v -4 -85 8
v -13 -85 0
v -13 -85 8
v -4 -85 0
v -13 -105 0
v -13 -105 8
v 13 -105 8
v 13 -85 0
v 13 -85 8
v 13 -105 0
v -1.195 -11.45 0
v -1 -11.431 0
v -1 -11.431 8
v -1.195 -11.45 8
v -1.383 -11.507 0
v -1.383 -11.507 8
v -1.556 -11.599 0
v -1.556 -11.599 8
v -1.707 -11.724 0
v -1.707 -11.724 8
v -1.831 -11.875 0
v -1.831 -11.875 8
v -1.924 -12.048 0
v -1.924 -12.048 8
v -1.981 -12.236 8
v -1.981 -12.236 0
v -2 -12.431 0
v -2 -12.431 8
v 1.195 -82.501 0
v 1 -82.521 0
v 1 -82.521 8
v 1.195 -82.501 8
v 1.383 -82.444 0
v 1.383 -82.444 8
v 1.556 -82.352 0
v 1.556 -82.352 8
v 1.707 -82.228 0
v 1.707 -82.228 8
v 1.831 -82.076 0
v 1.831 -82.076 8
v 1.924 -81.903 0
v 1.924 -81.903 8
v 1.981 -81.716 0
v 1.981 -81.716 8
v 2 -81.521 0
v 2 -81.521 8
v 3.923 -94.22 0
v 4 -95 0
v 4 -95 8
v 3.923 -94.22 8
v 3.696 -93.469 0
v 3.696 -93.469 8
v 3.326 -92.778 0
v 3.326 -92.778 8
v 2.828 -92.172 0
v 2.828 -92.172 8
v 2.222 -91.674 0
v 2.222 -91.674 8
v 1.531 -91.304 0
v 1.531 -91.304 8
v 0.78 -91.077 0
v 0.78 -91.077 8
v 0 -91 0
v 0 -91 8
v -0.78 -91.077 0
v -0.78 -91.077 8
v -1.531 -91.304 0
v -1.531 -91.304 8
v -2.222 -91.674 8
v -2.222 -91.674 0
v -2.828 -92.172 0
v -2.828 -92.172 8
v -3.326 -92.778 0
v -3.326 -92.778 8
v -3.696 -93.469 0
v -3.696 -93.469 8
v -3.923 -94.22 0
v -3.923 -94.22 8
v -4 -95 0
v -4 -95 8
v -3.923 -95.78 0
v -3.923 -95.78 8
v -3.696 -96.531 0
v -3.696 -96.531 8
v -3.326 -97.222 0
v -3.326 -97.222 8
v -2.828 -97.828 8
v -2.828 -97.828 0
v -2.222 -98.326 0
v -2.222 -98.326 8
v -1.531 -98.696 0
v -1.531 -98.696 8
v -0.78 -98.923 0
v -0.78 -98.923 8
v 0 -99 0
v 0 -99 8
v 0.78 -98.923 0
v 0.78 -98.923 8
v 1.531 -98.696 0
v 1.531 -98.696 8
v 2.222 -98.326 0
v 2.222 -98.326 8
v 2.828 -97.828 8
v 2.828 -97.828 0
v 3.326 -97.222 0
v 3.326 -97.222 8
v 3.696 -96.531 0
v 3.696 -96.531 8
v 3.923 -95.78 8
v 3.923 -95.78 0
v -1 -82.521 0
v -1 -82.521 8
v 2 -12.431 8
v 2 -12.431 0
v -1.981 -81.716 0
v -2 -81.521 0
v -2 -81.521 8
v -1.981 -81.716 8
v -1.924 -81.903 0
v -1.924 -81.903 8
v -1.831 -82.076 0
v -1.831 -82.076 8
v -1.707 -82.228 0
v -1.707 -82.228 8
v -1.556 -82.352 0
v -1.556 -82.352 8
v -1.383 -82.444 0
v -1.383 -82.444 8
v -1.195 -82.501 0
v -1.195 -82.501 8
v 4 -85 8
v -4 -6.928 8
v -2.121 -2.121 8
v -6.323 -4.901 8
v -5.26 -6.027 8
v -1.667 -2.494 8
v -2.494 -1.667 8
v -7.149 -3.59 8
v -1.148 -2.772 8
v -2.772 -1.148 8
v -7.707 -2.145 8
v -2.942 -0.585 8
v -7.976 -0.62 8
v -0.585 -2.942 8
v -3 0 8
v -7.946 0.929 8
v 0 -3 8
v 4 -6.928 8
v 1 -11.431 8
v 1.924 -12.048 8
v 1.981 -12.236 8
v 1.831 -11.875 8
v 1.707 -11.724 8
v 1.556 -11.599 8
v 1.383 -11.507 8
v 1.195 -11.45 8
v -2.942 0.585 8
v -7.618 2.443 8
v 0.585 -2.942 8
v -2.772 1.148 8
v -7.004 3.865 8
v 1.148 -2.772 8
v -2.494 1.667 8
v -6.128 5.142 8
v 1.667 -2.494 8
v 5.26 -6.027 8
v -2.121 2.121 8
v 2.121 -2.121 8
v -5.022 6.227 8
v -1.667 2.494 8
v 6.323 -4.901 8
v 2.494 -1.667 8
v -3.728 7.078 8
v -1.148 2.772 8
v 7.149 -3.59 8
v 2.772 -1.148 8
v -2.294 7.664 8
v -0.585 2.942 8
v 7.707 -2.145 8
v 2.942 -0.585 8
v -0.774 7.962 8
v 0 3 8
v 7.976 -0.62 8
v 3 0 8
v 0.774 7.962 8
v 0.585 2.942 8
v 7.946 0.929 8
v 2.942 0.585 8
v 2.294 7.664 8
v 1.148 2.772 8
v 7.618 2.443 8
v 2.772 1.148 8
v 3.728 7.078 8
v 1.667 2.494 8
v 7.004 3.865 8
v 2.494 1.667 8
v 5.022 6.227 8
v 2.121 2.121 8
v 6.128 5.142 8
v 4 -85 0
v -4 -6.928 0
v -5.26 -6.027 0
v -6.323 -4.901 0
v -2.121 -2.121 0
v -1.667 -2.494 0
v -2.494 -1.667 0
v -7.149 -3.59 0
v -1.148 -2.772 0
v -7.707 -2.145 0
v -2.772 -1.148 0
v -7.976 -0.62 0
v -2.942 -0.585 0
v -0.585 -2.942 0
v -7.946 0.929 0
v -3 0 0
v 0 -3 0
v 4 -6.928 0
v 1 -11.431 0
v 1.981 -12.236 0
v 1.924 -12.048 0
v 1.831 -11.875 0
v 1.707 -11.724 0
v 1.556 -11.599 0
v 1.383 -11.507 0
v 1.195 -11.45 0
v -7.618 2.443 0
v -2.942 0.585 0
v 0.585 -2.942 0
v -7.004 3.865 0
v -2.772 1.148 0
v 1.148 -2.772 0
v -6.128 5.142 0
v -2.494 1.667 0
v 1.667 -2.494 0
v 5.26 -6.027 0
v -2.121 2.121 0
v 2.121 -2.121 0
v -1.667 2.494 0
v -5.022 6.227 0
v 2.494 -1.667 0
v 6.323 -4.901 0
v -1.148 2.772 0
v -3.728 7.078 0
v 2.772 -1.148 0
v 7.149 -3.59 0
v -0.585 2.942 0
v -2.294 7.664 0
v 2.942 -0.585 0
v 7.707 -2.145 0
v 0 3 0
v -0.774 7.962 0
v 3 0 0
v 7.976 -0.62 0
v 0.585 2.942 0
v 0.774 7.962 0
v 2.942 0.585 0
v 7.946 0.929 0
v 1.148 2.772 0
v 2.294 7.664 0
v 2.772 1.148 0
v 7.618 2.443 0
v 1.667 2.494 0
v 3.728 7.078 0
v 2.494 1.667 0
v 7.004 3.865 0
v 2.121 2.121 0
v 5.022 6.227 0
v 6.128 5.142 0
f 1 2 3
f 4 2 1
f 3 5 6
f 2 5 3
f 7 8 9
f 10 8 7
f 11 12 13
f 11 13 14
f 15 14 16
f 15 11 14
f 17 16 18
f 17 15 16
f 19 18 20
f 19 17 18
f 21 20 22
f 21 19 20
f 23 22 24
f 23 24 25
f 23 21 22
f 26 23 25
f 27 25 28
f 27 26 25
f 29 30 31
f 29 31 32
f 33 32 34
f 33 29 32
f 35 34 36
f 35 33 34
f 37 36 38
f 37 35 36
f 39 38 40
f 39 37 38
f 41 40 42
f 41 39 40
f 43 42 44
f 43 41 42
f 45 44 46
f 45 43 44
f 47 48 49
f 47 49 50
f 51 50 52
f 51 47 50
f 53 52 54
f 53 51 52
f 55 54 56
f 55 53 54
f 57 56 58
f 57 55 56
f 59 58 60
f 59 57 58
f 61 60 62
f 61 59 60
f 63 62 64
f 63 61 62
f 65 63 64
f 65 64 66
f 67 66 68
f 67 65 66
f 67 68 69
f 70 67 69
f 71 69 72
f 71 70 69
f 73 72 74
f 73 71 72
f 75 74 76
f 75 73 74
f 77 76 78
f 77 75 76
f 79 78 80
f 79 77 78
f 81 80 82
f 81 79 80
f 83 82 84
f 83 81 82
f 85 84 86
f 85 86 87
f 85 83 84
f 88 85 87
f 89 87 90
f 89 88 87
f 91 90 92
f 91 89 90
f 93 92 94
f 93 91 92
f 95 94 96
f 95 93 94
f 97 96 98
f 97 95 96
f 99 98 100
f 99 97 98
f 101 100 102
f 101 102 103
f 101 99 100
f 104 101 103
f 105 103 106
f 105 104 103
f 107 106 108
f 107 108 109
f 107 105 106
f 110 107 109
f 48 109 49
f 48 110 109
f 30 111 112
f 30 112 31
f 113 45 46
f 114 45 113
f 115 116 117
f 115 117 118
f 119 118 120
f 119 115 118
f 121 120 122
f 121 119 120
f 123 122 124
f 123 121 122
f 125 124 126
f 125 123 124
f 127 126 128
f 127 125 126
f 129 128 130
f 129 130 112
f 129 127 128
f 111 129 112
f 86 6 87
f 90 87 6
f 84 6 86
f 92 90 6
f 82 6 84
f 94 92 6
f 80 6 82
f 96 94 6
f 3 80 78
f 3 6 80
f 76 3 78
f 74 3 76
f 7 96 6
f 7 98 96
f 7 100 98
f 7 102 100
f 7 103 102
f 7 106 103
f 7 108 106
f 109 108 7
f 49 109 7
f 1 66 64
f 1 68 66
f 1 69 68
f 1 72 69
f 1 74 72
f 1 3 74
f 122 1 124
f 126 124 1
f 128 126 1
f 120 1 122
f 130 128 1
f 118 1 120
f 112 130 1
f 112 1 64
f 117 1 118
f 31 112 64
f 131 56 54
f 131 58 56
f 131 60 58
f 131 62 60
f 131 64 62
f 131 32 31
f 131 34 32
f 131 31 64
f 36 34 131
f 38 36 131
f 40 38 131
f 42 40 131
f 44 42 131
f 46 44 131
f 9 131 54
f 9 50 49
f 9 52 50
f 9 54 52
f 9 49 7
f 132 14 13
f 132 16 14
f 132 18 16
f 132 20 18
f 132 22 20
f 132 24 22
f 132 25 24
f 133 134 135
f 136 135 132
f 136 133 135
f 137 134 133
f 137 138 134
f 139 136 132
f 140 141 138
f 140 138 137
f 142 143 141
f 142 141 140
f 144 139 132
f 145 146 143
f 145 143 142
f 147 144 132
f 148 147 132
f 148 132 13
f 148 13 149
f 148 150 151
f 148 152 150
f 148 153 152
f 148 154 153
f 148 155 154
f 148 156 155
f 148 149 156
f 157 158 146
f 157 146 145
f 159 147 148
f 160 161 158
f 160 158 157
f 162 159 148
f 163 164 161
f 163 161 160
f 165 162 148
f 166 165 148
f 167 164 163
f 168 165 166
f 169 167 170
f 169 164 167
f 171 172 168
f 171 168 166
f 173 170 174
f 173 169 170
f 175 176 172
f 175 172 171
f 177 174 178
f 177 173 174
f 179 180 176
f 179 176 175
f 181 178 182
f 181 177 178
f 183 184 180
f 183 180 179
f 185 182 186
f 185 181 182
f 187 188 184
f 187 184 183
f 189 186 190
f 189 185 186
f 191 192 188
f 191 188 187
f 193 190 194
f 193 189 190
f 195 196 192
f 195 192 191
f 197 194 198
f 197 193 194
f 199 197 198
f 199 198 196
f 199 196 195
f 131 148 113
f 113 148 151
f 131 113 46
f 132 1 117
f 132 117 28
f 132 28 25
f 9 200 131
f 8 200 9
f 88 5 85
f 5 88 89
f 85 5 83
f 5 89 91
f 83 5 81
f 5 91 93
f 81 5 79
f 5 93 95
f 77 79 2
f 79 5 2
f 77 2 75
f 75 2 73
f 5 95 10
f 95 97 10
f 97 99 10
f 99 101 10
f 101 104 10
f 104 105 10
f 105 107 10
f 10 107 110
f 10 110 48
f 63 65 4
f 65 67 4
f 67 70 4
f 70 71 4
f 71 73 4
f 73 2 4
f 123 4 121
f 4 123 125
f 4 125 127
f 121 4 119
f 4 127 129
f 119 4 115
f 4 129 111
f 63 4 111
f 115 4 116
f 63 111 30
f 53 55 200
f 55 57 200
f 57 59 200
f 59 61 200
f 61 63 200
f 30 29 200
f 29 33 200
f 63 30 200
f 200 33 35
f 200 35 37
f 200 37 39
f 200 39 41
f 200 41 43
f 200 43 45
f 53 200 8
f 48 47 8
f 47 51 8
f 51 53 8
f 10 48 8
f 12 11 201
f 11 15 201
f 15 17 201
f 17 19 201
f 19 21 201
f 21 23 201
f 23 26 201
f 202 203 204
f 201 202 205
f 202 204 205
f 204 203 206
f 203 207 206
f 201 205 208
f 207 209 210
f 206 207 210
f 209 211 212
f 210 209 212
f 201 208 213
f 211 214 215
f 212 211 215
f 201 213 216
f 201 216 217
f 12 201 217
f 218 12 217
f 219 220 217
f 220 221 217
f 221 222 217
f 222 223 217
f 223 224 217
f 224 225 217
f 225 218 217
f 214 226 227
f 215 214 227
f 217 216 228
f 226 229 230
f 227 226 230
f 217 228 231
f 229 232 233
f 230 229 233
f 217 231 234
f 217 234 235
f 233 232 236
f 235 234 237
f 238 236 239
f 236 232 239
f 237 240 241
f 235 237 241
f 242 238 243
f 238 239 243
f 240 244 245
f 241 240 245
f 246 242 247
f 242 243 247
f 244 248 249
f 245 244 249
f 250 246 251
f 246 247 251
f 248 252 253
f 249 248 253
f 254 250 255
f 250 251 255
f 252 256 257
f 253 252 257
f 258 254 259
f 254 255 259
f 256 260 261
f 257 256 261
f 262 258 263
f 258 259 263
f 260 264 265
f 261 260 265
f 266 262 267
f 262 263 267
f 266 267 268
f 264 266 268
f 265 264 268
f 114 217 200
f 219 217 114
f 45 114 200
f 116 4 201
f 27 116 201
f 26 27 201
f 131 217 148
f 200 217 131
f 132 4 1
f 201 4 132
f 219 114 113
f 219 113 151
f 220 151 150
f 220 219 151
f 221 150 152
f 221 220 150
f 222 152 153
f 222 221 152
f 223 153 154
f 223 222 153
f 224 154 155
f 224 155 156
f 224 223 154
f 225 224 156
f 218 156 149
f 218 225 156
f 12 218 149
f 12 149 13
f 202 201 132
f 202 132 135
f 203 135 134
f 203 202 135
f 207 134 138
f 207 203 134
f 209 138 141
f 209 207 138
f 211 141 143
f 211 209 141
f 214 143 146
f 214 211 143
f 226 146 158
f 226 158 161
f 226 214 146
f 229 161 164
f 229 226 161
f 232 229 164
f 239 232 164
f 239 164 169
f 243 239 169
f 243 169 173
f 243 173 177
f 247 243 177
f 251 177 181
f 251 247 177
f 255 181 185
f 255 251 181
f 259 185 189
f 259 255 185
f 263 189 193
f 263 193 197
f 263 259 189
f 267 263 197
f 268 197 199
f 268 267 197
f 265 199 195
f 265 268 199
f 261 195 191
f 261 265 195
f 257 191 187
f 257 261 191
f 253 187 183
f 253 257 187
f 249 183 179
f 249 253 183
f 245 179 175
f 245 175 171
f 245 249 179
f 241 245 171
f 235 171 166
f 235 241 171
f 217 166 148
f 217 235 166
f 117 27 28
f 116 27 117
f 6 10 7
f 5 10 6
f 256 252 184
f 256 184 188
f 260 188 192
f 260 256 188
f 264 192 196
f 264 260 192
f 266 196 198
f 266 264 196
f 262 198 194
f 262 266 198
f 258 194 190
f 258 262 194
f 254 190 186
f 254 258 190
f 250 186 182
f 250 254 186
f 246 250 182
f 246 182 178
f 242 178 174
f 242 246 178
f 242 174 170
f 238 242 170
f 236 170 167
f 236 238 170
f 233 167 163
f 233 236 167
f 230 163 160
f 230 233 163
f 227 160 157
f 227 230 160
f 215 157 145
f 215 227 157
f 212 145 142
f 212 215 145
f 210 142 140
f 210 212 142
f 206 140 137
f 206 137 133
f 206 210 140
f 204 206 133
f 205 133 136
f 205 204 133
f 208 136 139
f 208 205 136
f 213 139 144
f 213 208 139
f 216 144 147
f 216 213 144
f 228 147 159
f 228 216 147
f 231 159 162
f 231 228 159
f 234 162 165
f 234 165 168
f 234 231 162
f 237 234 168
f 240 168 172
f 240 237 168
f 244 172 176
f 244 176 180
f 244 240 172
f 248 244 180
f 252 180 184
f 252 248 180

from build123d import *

# Parameters (mm, degrees)
SKETCH1_R           = 6
SKETCH1_R_2         = 5
SKETCH1_R_3         = 3
SKETCH1_R_4         = 4
BOSS_EXTRUDE1_DEPTH = 8


with BuildPart() as part:
    # Sketch1 → Boss-Extrude1 (new body)
    # profile 1 of 3: a face of its own
    with BuildSketch(Plane.XY):
        with BuildLine():
            Line((4, -6.92820323), (4, -85))
            Line((4, -85), (13, -85))
            Line((13, -85), (13, -105))
            Line((13, -105), (-13, -105))
            Line((-13, -105), (-13, -85))
            Line((-13, -85), (-4, -85))
            Line((-4, -85), (-4, -6.92820323))
            ThreePointArc((-4, -6.92820323), (0, 8), (4, -6.92820323))
        make_face()
        with Locations((0, -95)):
            Circle(SKETCH1_R, mode=Mode.SUBTRACT)
        Circle(SKETCH1_R_2, mode=Mode.SUBTRACT)
        with BuildLine():
            Line((-2, -12.430963228), (-2, -81.520541763))
            ThreePointArc((-2, -81.520541763), (-1.707106781, -82.227648544), (-1, -82.520541763))
            Line((-1, -82.520541763), (1, -82.520541763))
            ThreePointArc((1, -82.520541763), (1.707106781, -82.227648544), (2, -81.520541763))
            Line((2, -81.520541763), (2, -12.430963228))
            ThreePointArc((2, -12.430963228), (1.707106781, -11.723856446), (1, -11.430963228))
            Line((1, -11.430963228), (-1, -11.430963228))
            ThreePointArc((-1, -11.430963228), (-1.707106781, -11.723856446), (-2, -12.430963228))
        make_face(mode=Mode.SUBTRACT)
    # profile 2 of 3: a face of its own
    with BuildSketch(Plane.XY):
        Circle(SKETCH1_R_2)
        Circle(SKETCH1_R_3, mode=Mode.SUBTRACT)
    # profile 3 of 3: a face of its own
    with BuildSketch(Plane.XY):
        with Locations((0, -95)):
            Circle(SKETCH1_R)
        with Locations((0, -95)):
            Circle(SKETCH1_R_4, mode=Mode.SUBTRACT)
    extrude(amount=BOSS_EXTRUDE1_DEPTH)


solid = part.part
